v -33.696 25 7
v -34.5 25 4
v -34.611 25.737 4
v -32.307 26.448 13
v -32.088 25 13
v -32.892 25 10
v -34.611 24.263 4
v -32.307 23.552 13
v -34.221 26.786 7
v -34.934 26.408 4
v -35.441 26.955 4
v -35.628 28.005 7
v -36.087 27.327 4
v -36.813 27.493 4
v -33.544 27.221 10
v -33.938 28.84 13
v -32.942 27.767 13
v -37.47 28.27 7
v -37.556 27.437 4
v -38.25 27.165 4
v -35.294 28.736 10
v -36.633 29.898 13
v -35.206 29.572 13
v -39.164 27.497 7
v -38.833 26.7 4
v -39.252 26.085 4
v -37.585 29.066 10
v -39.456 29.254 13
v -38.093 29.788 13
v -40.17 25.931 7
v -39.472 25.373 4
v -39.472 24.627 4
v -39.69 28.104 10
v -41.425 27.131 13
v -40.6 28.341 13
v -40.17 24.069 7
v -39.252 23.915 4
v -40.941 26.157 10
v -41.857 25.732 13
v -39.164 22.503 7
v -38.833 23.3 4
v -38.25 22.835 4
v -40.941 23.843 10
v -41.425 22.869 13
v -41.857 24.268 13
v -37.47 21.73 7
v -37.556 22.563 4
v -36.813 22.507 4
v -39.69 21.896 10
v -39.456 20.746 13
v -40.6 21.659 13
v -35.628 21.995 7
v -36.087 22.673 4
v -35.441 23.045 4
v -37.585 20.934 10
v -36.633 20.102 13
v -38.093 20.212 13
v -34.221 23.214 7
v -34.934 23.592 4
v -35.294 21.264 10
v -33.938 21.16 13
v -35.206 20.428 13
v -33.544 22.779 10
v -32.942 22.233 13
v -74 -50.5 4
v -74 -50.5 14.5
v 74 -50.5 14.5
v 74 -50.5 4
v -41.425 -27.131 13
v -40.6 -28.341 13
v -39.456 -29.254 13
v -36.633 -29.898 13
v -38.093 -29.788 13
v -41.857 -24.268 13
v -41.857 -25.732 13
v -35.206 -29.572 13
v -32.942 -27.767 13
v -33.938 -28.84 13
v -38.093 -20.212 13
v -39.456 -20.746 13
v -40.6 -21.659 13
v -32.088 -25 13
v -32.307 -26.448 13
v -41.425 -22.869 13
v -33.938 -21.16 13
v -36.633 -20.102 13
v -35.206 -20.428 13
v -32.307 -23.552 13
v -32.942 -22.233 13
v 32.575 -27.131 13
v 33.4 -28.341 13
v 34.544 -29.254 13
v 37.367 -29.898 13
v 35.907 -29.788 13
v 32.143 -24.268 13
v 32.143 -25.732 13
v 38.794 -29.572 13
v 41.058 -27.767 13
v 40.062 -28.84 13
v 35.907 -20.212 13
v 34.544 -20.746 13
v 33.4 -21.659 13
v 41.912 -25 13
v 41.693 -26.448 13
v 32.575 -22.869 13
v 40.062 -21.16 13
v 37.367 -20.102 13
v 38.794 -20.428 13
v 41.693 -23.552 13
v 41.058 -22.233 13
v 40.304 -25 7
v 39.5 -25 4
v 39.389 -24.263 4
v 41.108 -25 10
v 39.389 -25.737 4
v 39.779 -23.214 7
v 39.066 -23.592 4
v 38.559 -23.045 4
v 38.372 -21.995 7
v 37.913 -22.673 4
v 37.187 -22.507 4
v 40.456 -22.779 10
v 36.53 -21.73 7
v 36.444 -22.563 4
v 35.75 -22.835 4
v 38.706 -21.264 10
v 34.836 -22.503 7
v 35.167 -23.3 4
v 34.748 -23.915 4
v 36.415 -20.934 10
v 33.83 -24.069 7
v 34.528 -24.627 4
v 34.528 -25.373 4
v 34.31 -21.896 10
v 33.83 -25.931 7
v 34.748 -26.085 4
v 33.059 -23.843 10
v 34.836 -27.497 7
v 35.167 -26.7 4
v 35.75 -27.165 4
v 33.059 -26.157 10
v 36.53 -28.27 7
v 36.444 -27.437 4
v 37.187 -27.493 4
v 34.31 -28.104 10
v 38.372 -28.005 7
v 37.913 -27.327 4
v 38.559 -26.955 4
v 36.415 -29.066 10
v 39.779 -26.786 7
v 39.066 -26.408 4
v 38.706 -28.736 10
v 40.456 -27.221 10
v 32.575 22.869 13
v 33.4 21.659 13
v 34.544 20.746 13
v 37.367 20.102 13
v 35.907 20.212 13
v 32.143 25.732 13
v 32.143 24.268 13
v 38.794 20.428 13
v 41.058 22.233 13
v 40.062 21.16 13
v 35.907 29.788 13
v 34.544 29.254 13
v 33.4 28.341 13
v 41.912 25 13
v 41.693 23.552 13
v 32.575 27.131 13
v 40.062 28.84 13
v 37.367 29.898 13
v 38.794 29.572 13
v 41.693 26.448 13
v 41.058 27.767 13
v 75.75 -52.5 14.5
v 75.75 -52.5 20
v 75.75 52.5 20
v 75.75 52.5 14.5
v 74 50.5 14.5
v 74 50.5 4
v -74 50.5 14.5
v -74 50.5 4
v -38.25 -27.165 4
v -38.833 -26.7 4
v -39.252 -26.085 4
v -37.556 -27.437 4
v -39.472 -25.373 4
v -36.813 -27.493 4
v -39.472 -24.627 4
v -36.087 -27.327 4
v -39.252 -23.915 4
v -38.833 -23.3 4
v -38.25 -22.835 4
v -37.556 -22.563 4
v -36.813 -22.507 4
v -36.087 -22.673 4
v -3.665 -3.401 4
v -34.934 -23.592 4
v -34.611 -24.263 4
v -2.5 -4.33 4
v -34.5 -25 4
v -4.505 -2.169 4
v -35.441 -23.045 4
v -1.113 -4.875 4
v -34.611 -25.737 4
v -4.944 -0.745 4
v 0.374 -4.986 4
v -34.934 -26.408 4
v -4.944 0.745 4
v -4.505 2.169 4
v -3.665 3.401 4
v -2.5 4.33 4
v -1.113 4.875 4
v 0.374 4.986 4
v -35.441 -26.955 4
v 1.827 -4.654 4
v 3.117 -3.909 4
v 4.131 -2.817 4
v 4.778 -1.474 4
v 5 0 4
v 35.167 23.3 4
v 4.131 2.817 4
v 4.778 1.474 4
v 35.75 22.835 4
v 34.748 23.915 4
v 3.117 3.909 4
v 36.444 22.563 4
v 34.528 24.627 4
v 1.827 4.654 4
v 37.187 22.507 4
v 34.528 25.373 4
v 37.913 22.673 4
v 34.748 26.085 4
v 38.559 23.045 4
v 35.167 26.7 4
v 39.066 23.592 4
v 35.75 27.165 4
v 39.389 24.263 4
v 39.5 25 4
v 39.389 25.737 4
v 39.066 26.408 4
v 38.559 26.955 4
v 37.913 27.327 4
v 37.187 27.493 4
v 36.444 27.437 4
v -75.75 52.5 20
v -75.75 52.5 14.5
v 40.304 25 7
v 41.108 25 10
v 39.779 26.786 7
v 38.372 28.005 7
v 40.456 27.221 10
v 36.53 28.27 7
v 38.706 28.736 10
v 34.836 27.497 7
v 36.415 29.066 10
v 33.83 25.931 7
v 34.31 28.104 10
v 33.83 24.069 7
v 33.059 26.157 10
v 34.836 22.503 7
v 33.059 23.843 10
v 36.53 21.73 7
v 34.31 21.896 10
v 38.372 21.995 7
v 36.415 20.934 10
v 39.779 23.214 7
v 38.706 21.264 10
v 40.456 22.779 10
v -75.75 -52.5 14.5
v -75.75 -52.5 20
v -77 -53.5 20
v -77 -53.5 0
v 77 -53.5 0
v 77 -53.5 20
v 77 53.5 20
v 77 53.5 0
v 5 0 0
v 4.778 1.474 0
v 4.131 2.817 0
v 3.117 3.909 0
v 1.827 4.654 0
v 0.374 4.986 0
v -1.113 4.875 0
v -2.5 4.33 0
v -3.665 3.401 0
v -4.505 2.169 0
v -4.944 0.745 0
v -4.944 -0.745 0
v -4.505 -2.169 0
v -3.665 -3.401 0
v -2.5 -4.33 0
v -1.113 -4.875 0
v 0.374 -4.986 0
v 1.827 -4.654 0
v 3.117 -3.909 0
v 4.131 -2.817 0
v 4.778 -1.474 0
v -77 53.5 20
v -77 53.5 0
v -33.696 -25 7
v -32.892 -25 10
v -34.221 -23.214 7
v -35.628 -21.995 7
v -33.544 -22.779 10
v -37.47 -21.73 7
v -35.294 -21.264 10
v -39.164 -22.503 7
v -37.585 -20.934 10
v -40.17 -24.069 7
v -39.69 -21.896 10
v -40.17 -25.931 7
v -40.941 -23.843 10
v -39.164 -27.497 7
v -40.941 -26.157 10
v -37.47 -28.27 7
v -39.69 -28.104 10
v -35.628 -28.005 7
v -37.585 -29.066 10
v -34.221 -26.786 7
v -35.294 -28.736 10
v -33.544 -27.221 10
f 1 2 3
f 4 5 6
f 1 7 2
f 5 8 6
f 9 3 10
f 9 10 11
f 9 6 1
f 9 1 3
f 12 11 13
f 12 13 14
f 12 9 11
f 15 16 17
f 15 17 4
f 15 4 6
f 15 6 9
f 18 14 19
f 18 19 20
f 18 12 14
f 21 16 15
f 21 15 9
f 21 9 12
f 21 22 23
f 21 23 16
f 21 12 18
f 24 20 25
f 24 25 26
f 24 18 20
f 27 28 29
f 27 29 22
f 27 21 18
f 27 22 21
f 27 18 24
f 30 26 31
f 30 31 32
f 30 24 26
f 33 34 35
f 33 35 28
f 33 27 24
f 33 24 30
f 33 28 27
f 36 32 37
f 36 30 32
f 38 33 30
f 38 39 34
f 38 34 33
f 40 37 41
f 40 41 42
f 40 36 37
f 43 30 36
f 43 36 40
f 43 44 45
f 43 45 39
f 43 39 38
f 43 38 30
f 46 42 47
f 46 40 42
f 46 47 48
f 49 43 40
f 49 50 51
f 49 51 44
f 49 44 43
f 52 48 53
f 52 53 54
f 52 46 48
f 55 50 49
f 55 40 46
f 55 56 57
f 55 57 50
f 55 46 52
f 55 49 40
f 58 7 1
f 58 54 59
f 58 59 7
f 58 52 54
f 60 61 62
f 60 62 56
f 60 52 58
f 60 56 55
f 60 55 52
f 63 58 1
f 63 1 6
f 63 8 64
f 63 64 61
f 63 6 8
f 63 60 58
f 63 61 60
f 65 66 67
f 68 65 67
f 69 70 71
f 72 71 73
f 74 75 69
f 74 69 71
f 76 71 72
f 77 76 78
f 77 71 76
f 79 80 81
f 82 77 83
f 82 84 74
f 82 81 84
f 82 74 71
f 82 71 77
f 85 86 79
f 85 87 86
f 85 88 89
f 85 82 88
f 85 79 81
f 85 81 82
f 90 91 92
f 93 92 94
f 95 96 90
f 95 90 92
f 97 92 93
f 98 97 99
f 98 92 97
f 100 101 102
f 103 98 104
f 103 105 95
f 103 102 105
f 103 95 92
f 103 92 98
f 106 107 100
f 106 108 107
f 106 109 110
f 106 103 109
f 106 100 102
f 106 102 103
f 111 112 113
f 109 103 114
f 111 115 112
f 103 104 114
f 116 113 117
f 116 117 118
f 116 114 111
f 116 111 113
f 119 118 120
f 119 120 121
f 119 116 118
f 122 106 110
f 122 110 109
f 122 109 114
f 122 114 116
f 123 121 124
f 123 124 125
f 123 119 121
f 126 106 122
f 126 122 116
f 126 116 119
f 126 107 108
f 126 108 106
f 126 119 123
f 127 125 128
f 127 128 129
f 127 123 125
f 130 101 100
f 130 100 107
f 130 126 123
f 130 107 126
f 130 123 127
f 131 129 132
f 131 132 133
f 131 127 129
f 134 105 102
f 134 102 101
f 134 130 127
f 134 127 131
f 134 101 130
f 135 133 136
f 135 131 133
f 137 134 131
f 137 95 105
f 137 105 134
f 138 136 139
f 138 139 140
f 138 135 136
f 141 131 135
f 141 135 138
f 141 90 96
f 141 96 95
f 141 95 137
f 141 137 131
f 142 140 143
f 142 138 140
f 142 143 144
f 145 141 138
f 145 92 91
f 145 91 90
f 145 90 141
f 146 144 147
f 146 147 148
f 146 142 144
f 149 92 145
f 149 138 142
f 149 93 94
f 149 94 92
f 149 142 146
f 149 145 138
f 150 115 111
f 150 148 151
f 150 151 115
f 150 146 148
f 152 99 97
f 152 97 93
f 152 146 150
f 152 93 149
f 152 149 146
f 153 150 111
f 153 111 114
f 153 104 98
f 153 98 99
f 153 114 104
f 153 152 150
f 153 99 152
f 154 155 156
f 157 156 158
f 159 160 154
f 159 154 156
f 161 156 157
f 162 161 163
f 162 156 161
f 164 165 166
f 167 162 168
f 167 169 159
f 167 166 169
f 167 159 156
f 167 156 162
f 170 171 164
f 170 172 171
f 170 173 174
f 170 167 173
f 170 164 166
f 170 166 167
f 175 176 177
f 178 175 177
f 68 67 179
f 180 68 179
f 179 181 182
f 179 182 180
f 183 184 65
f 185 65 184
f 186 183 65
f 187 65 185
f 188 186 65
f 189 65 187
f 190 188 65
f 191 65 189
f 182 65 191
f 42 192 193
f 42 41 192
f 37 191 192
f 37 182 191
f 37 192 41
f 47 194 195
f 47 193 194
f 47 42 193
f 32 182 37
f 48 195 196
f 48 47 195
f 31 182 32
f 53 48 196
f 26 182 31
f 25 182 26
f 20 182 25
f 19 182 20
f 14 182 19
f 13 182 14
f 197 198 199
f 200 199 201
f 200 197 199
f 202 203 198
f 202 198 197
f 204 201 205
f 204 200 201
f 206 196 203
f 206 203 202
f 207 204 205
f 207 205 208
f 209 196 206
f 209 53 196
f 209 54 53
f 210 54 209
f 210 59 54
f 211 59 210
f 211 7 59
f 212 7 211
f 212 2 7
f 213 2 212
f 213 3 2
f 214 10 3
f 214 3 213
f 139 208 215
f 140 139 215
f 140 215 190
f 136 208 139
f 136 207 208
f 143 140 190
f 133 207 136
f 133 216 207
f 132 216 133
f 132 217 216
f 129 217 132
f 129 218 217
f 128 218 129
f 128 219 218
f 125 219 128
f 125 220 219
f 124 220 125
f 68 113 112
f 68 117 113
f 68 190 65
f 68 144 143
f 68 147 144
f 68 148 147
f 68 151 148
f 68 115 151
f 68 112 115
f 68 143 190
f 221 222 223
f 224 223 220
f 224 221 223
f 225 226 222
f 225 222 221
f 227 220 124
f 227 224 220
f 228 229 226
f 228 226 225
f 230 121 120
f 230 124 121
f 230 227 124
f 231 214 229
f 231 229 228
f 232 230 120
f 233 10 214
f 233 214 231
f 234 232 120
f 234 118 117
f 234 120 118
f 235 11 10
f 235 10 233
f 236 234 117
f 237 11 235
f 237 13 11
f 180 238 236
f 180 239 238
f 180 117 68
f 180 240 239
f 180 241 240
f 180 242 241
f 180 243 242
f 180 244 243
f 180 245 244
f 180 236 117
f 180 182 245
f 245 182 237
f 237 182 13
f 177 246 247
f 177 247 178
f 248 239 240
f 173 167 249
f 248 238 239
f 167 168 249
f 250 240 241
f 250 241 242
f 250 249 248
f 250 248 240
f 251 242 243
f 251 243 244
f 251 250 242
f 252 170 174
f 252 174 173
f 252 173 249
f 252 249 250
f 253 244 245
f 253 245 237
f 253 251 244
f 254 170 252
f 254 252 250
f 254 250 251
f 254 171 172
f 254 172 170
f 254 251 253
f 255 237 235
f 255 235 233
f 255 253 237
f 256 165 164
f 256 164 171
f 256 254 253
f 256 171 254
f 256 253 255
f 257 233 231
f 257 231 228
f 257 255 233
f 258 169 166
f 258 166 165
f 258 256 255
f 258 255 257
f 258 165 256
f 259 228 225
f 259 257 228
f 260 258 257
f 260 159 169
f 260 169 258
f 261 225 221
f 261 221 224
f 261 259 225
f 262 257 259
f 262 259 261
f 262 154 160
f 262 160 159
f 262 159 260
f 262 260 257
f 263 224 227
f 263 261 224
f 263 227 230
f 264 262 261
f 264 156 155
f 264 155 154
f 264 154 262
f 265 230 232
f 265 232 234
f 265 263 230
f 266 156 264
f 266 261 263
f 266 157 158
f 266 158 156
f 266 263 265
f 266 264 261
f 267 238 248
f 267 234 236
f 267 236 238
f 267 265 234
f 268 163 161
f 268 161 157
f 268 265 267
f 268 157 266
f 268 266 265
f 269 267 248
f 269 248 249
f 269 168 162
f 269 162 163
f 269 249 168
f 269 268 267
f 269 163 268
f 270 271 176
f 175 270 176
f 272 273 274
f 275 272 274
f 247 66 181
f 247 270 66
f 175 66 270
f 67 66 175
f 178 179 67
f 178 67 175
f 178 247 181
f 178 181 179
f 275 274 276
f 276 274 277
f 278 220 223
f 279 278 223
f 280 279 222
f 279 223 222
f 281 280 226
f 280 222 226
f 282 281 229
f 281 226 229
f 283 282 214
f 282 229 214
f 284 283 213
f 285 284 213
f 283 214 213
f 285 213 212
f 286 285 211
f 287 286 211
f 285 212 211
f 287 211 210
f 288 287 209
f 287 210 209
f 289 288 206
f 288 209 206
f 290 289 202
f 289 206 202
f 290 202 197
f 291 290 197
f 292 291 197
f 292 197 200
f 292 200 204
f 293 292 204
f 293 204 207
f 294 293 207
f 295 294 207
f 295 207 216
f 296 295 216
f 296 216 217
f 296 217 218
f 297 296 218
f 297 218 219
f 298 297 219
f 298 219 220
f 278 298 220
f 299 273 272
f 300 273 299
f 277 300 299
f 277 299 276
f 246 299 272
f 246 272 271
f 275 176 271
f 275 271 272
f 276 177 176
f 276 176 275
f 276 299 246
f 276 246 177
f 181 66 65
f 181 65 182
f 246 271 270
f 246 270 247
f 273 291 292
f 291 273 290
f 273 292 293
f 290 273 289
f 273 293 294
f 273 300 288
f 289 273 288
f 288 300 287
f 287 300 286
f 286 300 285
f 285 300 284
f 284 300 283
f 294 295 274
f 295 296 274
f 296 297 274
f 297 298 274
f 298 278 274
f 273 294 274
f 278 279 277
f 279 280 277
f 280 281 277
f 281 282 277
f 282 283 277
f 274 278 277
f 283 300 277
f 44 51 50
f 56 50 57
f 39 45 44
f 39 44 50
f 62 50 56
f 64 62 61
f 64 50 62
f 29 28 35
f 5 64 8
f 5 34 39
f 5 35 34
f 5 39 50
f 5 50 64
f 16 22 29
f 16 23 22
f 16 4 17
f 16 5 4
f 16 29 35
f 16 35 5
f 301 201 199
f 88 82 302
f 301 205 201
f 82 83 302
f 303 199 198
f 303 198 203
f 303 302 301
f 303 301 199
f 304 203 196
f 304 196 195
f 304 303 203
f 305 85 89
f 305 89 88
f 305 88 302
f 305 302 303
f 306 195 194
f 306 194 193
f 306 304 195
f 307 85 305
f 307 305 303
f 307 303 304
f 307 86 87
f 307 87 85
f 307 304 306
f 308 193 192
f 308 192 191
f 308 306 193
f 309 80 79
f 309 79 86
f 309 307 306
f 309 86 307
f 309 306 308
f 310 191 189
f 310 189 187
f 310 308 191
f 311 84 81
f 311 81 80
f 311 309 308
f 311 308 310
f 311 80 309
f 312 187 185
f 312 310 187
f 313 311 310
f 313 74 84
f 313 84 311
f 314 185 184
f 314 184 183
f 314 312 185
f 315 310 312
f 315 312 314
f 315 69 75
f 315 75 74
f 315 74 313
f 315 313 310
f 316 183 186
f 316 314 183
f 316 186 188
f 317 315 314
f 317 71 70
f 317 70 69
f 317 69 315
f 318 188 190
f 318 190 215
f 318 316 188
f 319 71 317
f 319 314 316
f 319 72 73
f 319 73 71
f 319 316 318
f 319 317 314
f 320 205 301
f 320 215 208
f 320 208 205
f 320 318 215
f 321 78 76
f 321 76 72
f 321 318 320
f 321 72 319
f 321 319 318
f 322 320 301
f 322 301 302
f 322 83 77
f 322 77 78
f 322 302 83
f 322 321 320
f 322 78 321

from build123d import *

# Parameters (mm, degrees)
SKETCH_W        = 154
SKETCH_H        = 107
PAD_DEPTH       = 20
SKETCH001_W     = 151.5
SKETCH001_H     = 105
POCKET_DEPTH    = 5.5
SKETCH002_W     = 148
SKETCH002_H     = 101
POCKET001_DEPTH = 10.5
SKETCH003_R     = 5
POCKET002_DEPTH = 4.001
SKETCH004_R     = 2.5
PAD001_DEPTH    = 9
PAD001_TAPER    = -15


with BuildPart() as part:
    # Sketch → Pad (new body)
    with BuildSketch(Plane.XY):
        Rectangle(SKETCH_W, SKETCH_H)
    extrude(amount=PAD_DEPTH)

    # Sketch001 (on Face6 of Pad) → Pocket (cut)
    with BuildSketch(Plane.XY.offset(20)):
        Rectangle(SKETCH001_W, SKETCH001_H)
    extrude(amount=-POCKET_DEPTH, mode=Mode.SUBTRACT)

    # Sketch002 (on Face11 of Pocket) → Pocket001 (cut)
    with BuildSketch(Plane.XY.offset(14.5)):
        Rectangle(SKETCH002_W, SKETCH002_H)
    extrude(amount=-POCKET001_DEPTH, mode=Mode.SUBTRACT)

    # Sketch003 (on Face16 of Pocket001) → Pocket002 (cut, through all)
    with BuildSketch(Plane.XY.offset(4)):
        Circle(SKETCH003_R)
    extrude(amount=-POCKET002_DEPTH, mode=Mode.SUBTRACT)

    # Sketch004 (on Face12 of Pocket002) → Pad001 (join)
    with BuildSketch(Plane.XY.offset(4)):
        with Locations((-37, 25)):
            Circle(SKETCH004_R)
        with Locations((37, 25)):
            Circle(SKETCH004_R)
        with Locations((37, -25)):
            Circle(SKETCH004_R)
        with Locations((-37, -25)):
            Circle(SKETCH004_R)
    extrude(amount=PAD001_DEPTH, taper=PAD001_TAPER)


solid = part.part
